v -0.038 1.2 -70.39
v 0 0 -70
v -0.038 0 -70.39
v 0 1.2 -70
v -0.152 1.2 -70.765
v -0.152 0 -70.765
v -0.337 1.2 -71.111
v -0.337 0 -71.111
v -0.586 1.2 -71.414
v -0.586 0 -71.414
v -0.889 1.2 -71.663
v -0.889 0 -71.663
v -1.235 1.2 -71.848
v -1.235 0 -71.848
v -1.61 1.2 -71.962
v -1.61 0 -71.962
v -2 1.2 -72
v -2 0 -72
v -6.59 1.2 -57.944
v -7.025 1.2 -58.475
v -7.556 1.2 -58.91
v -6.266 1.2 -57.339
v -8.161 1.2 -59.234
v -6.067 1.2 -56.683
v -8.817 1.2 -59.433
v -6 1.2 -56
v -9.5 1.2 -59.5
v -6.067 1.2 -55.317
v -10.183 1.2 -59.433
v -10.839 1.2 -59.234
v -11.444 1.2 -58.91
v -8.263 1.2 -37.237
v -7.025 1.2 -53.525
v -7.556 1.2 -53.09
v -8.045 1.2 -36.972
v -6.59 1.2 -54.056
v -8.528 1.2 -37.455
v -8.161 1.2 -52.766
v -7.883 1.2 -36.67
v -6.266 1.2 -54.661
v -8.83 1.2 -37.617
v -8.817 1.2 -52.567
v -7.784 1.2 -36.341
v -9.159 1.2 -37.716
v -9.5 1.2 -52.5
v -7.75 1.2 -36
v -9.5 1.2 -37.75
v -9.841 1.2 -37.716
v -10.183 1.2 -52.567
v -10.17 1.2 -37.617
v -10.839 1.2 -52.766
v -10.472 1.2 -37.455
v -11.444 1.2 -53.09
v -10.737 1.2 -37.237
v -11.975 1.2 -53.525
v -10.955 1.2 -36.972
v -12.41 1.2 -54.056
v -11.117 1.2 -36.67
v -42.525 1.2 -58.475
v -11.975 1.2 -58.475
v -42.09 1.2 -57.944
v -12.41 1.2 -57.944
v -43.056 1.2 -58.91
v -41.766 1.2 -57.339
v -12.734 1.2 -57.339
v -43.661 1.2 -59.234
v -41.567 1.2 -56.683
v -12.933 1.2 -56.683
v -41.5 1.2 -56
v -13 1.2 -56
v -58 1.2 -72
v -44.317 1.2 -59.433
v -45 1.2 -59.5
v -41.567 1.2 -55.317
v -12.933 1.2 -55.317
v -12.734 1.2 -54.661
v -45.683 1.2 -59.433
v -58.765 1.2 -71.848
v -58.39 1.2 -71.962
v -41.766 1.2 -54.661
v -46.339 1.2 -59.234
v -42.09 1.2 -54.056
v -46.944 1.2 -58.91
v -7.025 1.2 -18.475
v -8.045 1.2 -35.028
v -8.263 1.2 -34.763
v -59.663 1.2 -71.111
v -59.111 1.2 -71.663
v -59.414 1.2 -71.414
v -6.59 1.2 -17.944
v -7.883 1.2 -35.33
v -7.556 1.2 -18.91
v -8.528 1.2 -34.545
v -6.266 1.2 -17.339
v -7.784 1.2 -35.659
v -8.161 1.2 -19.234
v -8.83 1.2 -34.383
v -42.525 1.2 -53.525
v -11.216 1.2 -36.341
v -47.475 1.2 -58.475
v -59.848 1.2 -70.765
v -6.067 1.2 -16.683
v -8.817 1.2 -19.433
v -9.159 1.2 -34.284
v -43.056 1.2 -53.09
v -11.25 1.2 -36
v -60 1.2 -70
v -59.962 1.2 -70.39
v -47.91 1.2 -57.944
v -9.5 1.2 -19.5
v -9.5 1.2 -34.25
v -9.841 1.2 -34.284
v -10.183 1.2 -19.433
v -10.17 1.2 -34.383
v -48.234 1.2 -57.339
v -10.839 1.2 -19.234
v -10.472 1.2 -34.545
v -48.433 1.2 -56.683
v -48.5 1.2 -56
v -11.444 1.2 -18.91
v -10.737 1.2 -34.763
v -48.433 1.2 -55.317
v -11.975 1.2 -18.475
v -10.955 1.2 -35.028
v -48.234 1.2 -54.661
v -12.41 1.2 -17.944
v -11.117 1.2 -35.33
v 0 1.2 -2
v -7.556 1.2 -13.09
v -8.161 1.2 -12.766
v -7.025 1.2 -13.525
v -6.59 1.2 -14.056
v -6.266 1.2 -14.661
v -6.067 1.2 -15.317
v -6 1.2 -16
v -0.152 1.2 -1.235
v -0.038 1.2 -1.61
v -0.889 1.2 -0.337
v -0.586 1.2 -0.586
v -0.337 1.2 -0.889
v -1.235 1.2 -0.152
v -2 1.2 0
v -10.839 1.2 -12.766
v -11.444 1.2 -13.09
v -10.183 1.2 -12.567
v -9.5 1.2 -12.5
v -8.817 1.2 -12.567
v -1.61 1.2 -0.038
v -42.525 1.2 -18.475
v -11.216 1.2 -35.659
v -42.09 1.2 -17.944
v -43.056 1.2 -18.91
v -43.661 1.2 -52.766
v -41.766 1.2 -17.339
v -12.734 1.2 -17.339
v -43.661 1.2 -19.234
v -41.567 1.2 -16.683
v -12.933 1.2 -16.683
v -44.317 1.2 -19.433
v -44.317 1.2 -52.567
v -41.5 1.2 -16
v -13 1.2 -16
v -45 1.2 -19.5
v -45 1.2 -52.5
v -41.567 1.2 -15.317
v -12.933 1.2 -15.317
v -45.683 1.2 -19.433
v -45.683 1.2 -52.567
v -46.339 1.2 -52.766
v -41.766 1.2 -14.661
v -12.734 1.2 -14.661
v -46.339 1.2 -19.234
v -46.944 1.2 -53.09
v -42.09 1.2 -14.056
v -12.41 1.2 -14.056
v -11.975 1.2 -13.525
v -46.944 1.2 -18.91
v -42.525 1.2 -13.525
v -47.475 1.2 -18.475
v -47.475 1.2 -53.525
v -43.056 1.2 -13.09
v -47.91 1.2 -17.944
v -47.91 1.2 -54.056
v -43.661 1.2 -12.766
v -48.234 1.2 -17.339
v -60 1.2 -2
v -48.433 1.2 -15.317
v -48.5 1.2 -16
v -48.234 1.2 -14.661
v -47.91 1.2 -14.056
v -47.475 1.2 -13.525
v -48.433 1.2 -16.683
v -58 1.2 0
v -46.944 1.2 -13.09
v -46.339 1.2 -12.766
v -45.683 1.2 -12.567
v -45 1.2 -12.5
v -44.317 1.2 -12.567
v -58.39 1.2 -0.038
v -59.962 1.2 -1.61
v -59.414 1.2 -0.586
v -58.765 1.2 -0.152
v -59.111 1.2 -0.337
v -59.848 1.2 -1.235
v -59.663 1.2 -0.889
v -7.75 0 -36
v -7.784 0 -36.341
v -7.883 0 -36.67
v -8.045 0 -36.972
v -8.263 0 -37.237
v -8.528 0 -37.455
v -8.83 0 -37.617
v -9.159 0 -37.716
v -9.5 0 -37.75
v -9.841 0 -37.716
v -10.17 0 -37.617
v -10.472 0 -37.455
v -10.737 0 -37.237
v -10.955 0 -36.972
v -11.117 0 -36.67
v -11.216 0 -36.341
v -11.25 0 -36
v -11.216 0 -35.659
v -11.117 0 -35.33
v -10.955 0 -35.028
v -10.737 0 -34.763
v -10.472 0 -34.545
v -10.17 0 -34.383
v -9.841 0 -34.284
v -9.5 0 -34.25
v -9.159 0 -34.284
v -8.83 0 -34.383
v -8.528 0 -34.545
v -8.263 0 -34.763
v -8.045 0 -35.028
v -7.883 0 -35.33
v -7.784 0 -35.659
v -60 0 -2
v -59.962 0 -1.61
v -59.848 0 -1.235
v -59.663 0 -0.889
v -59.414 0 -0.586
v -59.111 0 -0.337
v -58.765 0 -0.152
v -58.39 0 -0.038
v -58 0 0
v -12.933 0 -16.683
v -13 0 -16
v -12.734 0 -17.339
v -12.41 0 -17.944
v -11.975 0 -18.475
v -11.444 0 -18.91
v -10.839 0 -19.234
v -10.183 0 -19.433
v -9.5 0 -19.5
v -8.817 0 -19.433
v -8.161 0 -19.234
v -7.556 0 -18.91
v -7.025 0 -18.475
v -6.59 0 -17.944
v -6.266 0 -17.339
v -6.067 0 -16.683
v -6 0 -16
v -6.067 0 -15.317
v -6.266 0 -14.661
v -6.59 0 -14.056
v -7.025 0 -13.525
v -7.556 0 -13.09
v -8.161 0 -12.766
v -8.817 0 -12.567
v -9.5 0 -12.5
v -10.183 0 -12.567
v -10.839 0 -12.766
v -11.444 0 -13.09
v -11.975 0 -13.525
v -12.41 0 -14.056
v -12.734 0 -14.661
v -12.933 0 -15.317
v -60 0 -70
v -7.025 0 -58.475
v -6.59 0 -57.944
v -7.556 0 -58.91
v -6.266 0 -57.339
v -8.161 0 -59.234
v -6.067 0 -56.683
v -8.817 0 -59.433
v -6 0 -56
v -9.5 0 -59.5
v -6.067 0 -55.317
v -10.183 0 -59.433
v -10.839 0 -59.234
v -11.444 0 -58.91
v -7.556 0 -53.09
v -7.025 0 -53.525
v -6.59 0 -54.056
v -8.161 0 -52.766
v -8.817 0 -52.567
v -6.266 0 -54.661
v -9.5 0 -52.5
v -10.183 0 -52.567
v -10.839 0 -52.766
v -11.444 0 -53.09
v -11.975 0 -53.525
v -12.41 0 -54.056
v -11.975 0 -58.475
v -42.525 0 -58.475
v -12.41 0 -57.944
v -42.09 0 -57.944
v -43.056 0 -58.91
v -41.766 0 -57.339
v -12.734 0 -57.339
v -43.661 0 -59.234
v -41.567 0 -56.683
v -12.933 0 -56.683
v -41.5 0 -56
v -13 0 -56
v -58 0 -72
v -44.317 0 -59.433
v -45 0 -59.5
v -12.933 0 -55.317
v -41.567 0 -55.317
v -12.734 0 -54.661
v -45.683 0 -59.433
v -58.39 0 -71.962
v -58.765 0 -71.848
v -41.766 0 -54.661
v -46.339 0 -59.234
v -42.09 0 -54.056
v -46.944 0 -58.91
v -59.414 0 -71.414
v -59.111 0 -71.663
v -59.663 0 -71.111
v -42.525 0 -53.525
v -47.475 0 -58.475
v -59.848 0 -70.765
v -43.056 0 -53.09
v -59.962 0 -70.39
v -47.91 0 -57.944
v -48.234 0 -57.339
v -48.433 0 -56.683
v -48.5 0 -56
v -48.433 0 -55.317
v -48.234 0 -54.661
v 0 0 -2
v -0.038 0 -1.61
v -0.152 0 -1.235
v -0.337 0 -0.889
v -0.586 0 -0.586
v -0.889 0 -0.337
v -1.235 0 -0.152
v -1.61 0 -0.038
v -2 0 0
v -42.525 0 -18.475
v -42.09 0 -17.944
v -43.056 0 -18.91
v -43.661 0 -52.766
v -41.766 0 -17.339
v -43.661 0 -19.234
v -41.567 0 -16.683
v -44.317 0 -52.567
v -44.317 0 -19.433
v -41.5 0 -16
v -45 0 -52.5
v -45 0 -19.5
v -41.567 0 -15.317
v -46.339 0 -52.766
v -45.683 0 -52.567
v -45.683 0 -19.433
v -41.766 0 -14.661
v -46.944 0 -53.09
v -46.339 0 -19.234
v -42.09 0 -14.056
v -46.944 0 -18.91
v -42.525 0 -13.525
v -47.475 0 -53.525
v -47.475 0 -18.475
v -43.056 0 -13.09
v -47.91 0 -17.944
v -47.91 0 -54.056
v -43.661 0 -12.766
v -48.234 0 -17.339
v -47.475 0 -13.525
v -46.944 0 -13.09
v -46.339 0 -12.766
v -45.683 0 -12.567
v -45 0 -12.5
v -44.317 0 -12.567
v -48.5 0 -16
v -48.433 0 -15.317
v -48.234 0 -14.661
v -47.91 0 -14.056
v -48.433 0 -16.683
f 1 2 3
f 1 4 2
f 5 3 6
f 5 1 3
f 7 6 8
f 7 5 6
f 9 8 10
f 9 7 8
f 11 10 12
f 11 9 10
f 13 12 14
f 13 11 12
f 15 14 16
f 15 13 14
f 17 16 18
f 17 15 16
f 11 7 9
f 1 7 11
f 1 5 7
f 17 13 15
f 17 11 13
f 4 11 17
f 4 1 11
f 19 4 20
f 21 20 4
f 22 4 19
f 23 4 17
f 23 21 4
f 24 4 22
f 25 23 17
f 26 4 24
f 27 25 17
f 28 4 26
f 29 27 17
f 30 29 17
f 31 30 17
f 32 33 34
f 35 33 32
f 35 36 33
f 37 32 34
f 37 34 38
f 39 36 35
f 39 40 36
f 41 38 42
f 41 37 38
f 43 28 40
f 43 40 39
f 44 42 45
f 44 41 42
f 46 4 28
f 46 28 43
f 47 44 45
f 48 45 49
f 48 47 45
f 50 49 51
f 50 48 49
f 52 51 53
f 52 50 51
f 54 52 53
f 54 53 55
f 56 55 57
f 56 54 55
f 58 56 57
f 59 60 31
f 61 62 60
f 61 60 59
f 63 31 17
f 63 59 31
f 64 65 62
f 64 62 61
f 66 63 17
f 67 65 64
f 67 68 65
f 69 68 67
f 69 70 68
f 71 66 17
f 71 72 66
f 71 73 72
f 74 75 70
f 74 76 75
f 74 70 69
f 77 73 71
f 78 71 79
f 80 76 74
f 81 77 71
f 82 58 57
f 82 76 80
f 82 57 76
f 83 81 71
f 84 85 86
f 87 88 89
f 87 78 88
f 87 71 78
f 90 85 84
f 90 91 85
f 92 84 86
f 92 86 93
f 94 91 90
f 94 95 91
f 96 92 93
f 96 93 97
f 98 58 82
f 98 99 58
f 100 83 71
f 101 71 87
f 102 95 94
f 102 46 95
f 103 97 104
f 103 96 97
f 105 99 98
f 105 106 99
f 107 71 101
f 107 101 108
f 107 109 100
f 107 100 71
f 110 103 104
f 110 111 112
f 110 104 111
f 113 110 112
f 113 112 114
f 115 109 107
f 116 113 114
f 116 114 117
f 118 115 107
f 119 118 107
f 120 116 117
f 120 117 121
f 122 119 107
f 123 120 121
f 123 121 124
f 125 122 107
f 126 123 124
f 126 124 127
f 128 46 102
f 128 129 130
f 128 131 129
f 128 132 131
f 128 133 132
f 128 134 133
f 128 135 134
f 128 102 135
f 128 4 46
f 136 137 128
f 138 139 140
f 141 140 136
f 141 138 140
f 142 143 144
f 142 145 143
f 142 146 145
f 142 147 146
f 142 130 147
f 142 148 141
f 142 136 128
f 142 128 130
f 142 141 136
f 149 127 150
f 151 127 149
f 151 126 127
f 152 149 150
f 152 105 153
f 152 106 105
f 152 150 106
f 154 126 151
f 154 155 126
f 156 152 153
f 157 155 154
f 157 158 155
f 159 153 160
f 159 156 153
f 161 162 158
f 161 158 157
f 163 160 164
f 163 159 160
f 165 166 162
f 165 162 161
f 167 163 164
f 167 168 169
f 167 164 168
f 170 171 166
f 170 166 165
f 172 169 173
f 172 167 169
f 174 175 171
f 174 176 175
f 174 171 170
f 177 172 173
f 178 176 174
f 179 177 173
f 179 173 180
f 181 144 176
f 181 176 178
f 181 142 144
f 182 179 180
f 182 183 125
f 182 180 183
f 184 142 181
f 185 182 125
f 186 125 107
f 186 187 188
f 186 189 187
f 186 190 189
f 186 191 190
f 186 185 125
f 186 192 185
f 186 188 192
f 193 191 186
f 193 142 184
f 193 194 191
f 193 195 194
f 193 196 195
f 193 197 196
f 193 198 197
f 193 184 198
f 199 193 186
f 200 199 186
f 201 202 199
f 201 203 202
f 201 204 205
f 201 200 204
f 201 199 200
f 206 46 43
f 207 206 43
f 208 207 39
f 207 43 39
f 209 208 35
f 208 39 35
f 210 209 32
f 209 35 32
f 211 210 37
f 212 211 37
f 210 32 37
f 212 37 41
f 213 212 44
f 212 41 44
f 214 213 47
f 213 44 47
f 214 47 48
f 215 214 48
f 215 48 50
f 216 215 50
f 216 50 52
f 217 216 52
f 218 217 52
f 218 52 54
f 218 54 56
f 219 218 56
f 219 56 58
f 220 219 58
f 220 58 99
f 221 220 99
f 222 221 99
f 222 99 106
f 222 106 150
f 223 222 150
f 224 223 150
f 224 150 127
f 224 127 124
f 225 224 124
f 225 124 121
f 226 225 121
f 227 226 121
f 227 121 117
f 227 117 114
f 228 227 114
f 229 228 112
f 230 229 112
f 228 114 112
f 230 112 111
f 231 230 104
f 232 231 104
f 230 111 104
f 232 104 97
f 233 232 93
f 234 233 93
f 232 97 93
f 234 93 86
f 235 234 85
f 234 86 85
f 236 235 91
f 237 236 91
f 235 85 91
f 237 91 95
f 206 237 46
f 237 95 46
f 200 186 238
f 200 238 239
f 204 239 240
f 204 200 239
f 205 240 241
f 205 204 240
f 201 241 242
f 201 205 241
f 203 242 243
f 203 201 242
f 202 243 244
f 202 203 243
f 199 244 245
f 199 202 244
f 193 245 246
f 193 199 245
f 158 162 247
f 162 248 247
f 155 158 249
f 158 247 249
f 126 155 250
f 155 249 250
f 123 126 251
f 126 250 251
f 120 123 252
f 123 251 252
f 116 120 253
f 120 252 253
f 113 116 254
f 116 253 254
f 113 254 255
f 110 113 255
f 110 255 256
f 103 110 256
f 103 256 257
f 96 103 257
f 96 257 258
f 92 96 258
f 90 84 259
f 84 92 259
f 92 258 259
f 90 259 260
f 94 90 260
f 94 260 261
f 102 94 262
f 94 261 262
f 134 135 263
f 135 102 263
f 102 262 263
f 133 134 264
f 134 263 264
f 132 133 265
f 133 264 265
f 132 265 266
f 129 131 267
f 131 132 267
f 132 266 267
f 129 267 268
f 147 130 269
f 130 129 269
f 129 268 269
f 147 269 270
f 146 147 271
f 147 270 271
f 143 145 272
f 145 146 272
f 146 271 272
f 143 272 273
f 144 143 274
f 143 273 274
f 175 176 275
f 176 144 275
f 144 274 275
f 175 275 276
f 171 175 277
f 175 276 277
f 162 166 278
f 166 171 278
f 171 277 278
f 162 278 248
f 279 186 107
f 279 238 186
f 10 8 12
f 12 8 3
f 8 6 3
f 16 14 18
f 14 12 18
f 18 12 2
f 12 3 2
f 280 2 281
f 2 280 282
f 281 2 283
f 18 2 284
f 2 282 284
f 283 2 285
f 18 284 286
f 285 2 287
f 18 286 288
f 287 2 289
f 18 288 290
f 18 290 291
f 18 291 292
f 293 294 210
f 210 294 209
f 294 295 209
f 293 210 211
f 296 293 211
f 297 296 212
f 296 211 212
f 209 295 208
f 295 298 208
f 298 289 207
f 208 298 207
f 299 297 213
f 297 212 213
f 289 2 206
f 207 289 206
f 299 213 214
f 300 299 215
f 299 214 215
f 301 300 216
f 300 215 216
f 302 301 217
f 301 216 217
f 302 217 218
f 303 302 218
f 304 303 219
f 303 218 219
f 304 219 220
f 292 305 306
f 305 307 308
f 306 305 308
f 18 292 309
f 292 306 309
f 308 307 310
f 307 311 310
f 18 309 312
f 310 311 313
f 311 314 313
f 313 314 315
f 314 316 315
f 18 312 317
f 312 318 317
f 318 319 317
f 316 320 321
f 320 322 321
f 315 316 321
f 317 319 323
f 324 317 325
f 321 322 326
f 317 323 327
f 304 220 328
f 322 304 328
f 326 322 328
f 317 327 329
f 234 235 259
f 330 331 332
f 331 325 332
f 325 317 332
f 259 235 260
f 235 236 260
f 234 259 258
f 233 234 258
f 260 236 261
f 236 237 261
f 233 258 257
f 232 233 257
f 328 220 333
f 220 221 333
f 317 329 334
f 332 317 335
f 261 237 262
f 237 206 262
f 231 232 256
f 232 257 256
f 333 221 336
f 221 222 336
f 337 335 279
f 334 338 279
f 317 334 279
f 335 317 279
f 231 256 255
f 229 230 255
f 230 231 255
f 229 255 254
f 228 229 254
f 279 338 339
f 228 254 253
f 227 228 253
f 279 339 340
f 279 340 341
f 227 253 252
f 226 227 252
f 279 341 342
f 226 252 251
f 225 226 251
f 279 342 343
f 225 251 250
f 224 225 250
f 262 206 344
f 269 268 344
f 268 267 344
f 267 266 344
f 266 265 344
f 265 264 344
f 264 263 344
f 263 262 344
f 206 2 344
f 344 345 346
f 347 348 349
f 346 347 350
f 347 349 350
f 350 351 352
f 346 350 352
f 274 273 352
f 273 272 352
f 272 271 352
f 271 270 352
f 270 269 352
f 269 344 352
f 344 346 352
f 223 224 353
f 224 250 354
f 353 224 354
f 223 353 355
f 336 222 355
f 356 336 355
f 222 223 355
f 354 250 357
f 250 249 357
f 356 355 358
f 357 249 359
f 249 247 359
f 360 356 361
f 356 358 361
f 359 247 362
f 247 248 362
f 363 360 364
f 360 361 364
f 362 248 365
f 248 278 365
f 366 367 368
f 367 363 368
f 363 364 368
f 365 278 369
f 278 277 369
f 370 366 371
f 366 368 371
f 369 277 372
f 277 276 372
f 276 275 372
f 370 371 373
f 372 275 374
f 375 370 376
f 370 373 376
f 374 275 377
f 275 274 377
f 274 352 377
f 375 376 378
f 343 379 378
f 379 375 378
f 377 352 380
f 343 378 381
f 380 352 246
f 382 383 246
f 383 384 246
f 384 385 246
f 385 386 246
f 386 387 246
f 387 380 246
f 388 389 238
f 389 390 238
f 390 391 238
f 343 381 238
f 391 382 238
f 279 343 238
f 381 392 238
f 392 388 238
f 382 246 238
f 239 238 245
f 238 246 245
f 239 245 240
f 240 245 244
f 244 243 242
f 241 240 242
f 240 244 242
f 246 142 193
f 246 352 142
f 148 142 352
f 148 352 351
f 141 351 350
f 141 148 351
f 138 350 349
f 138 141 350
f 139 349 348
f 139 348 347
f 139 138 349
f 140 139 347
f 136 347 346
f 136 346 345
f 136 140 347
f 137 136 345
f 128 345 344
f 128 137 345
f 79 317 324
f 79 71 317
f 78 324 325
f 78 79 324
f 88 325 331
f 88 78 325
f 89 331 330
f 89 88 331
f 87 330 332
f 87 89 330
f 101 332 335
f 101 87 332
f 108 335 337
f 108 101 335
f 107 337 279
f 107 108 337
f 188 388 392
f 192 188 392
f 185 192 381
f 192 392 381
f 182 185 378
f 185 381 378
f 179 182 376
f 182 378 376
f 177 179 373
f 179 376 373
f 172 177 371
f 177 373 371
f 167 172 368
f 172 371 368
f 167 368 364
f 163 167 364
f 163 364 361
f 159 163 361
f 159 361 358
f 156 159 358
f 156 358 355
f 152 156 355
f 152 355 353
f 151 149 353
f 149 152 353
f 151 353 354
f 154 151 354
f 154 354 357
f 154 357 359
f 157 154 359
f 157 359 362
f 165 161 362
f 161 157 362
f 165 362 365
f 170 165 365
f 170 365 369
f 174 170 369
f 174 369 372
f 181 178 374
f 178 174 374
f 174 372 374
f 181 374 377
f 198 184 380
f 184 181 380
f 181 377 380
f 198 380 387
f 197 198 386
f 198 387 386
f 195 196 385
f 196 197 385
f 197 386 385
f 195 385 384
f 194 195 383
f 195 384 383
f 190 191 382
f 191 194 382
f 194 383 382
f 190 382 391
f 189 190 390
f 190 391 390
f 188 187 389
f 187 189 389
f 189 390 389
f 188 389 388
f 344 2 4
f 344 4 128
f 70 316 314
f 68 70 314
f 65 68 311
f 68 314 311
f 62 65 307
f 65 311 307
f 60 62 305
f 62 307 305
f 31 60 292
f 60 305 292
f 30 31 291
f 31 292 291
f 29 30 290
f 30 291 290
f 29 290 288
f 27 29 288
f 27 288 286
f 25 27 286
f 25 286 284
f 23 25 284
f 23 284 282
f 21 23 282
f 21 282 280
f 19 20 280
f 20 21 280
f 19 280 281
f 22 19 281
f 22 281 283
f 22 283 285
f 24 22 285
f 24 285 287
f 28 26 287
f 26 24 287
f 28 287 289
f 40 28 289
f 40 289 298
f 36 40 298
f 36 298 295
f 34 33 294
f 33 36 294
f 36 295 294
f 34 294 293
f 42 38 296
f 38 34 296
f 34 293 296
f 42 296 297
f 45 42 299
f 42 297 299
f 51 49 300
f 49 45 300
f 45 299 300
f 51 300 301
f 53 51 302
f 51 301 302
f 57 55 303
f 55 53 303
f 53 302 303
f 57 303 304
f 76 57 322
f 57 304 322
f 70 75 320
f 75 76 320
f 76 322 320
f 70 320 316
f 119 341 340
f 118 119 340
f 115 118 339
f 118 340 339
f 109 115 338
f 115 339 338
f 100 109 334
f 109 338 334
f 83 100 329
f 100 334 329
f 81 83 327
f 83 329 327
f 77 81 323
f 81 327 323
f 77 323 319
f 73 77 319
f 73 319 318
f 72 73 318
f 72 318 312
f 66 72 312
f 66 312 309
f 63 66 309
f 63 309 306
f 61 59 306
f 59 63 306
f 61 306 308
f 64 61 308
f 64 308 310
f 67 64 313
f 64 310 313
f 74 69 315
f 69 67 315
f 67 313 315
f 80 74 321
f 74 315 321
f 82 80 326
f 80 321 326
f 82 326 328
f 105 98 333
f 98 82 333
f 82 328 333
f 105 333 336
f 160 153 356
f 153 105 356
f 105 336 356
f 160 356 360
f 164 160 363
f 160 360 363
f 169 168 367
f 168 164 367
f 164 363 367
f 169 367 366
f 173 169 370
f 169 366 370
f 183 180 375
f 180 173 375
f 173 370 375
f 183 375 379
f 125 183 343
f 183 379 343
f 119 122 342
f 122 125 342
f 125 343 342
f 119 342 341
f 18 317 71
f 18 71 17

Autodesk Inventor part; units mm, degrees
ref_plane "YZ Plane" through (0, 0, 0) normal (1, 0, 0) x (0, 1, 0)
ref_plane "XZ Plane" through (0, 0, 0) normal (0, 1, 0) x (-1, 0, 0)
ref_plane "XY Plane" through (0, 0, 0) normal (0, 0, 1) x (1, 0, 0)
sketch "Esboço1" plane through (0, 0, 0) normal (0, 1, 0) x (-1, 0, 0)
  line L0 (0, 0) -> (60, 0)
  line L1 (60, 0) -> (60, -12)
  line L2 (60, -12) -> (60, -19)
  line L3 (60, -19) -> (60, -53)
  line L4 (60, -53) -> (60, -60)
  line L5 (60, -60) -> (60, -72)
  line L6 (60, -72) -> (0, -72)
  line L7 (0, -72) -> (0, 0)
  line L8 (0, 0) -> (19, 0)
  line L9 (60, 0) -> (30, 0)
  circle A0 centre (45, -16) radius 3.5
  circle A1 centre (45, -56) radius 3.5
  circle A2 centre (9.5, -16) radius 3.5
  circle A3 centre (9.5, -56) radius 3.5
  dimension "d0" = 60
  dimension "d1" = 12
  dimension "d2" = 7
  dimension "d3" = 34
  dimension "d4" = 7
  dimension "d5" = 12
  dimension "d6" = 72
  dimension "d7" = 19
  dimension "d12" = 30
  dimension "d23" = 7
  dimension "d24" = 7
  dimension "d25" = 7
  dimension "d26" = 7
extrude "Extrusão2" add sketch "Esboço1" along normal blind 1.2
fillet "Arredondamento2" radius 2 4 edges at (-60, 0.6, 0) (-60, 0.6, -72) (0, 0.6, 0) (0, 0.6, -72)
sketch "Esboço2" plane through (0, 1.2, 0) normal (0, 1, 0) x (1, 0, 0)
  circle A0 centre (-45, 56) radius 3.5 projected
  line L0 (-45, 56) -> (-30, 56)
  line L1 (-30, 56) -> (-20, 56)
  line L2 (0, 2) -> (0, 70) projected
  circle A1 centre (-9.5, 16) radius 3.5 projected
  circle A2 centre (-9.5, 36) radius 1.75
  point P0 (0, 0)
  dimension "d30" = 15
  dimension "d31" = 10
extrude "Extrusão5" cut sketch "Esboço2" against normal blind 10 contours A2
properties part number "chapa-fixação-caixa" material "Aço galvanizado"
